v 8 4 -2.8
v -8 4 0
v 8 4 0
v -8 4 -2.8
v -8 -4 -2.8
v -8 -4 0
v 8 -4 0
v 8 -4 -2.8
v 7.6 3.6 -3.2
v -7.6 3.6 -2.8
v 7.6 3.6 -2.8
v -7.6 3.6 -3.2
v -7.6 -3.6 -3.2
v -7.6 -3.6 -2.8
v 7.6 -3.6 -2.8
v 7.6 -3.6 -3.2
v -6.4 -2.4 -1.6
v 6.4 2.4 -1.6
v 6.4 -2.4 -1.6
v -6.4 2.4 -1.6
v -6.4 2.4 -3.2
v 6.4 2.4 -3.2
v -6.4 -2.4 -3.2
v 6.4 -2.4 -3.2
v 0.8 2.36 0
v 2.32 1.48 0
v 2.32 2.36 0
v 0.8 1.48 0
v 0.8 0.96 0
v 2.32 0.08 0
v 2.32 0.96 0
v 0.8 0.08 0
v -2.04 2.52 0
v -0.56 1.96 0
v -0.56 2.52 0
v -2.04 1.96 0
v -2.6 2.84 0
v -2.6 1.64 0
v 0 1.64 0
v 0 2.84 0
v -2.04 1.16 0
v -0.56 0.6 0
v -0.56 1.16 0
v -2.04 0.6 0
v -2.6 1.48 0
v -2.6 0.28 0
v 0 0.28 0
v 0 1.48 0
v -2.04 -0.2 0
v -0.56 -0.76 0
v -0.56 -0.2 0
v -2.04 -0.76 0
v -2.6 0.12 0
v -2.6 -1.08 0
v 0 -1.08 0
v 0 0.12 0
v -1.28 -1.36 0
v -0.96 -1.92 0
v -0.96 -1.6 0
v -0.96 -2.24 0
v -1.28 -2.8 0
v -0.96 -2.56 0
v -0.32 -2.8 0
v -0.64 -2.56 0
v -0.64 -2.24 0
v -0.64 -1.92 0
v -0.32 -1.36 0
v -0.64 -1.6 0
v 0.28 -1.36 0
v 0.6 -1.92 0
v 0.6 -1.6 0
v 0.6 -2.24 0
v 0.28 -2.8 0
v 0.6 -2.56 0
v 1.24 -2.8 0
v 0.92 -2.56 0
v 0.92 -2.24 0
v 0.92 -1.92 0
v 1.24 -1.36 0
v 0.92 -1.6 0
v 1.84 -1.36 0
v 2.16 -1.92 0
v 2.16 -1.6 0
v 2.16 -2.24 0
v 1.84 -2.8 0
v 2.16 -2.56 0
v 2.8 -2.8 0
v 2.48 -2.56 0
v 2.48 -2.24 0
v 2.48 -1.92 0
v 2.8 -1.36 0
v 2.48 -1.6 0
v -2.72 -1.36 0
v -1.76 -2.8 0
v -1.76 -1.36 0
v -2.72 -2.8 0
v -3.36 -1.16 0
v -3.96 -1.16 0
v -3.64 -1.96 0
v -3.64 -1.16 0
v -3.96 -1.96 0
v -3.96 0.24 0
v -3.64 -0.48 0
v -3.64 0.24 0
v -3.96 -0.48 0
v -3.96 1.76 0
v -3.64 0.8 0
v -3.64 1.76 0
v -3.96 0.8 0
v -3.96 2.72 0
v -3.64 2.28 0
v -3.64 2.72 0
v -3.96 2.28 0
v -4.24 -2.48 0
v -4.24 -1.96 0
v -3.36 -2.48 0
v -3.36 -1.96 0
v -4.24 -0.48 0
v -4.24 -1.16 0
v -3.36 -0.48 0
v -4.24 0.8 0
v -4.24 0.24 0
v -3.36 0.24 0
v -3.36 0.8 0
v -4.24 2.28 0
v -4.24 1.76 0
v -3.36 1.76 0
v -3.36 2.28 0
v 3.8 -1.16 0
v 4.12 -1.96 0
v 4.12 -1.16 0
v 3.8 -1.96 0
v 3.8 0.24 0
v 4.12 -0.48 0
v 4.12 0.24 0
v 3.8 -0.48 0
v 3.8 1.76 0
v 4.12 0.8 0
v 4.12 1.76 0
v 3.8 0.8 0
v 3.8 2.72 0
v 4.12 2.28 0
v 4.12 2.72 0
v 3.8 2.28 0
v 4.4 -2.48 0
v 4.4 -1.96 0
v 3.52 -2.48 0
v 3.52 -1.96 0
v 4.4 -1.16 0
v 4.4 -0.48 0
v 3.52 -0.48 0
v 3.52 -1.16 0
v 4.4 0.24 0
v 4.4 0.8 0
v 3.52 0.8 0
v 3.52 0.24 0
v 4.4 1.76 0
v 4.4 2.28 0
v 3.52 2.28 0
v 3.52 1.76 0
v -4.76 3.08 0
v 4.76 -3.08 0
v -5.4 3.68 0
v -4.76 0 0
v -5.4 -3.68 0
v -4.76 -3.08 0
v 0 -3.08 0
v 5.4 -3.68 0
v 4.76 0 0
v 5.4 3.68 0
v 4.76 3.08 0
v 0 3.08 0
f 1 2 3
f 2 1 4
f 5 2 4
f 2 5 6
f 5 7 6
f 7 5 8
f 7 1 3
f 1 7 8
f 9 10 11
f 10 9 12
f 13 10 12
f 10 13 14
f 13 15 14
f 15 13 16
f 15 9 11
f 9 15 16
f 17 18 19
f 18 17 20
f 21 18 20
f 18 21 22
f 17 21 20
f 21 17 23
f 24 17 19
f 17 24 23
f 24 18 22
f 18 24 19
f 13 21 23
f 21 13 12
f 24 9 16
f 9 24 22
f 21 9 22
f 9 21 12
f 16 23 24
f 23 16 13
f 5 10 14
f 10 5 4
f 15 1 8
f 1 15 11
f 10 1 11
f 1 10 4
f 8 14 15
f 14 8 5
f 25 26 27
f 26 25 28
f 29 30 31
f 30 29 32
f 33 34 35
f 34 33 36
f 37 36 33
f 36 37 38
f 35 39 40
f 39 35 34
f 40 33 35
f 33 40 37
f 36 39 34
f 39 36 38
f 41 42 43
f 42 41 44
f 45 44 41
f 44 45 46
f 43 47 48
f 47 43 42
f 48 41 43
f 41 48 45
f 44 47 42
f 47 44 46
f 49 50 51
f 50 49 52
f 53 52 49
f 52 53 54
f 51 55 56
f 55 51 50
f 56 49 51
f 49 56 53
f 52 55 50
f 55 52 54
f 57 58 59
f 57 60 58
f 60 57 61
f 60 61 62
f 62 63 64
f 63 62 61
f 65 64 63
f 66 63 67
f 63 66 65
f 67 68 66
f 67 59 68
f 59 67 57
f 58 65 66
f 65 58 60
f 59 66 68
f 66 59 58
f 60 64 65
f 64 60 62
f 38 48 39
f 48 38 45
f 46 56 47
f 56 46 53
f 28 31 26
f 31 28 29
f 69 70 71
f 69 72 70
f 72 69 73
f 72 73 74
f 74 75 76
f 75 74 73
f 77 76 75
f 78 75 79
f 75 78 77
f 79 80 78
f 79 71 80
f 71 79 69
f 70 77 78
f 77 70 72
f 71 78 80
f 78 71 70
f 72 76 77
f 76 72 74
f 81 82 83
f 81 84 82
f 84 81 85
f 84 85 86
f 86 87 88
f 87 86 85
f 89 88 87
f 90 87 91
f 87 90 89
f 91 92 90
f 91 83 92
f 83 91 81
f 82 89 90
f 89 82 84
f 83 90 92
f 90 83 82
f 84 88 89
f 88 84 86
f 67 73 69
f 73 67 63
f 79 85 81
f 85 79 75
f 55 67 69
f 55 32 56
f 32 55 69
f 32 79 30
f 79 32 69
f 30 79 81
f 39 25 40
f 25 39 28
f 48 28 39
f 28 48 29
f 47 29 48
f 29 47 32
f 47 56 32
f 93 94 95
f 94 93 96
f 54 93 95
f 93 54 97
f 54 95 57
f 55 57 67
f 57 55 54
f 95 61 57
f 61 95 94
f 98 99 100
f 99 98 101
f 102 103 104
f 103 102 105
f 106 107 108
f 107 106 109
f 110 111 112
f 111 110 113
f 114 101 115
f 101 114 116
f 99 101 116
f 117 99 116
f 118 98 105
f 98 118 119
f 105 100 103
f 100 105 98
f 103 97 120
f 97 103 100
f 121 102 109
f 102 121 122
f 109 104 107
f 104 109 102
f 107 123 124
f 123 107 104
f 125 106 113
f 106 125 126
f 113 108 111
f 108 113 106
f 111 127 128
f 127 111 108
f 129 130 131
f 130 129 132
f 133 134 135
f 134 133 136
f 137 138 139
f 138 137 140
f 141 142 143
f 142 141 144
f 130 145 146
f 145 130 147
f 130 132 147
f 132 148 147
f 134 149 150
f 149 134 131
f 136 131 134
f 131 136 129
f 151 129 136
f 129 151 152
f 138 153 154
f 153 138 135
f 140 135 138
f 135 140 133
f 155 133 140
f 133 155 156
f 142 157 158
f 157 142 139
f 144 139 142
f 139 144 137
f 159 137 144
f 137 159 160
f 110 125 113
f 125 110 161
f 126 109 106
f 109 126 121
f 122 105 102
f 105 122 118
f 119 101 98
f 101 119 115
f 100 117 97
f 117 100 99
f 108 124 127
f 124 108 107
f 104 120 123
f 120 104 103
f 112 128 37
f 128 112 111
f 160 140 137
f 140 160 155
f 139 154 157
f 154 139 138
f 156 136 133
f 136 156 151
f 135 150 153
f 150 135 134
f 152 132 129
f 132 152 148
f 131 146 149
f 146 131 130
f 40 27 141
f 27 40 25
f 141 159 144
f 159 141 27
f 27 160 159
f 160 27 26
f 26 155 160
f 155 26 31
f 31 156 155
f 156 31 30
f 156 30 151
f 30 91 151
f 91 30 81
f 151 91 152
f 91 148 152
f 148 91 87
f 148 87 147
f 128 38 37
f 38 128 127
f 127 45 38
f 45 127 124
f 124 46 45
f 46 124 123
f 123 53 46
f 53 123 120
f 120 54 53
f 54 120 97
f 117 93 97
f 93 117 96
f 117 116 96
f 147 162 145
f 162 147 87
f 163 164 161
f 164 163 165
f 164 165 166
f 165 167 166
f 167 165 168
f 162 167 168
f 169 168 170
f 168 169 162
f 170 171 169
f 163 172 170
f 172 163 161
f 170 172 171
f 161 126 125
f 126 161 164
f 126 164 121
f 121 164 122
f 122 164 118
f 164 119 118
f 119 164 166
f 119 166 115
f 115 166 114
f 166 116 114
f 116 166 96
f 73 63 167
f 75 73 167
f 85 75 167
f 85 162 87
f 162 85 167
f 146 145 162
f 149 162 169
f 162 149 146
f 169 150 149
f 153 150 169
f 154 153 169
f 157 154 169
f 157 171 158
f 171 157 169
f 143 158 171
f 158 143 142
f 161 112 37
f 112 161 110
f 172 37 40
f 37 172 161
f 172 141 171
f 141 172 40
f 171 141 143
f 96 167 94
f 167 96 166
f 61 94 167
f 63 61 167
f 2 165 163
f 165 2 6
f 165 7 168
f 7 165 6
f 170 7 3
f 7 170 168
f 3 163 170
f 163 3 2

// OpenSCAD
// file: ../p/box5.scad
use <../lib.scad>
function ldraw_lib__box5() = [
// 0 Box with 5 Faces and All Edges
// 0 Name: box5.dat
// 0 Author: James Jessiman
// 0 !LDRAW_ORG Primitive UPDATE 2012-01
// 0 !LICENSE Licensed under CC BY 4.0 : see CAreadme.txt
// 
// 0 BFC CERTIFY CCW
  [0,"BFC","CERTIFY"],
  [0,"BFC","CCW"],
// 
// 0 !HISTORY 2002-04-03 [sbliss] Modified for BFC compliance
// 0 !HISTORY 2002-04-25 [PTadmin] Official Update 2002-02
// 0 !HISTORY 2007-06-24 [PTadmin] Header formatted for Contributor Agreement
// 0 !HISTORY 2008-07-01 [PTadmin] Official Update 2008-01
// 0 !HISTORY 2012-02-16 [Philo] Changed to CCW
// 0 !HISTORY 2012-03-30 [PTadmin] Official Update 2012-01
// 
// 
// 2 24 1 1 1 -1 1 1
  [2,24,1,1,1,-1,1,1],
// 2 24 -1 1 1 -1 1 -1
  [2,24,-1,1,1,-1,1,-1],
// 2 24 -1 1 -1 1 1 -1
  [2,24,-1,1,-1,1,1,-1],
// 2 24 1 1 -1 1 1 1
  [2,24,1,1,-1,1,1,1],
// 2 24 1 0 1 -1 0 1
  [2,24,1,0,1,-1,0,1],
// 2 24 -1 0 1 -1 0 -1
  [2,24,-1,0,1,-1,0,-1],
// 2 24 -1 0 -1 1 0 -1
  [2,24,-1,0,-1,1,0,-1],
// 2 24 1 0 -1 1 0 1
  [2,24,1,0,-1,1,0,1],
// 2 24 1 0 1 1 1 1
  [2,24,1,0,1,1,1,1],
// 2 24 -1 0 1 -1 1 1
  [2,24,-1,0,1,-1,1,1],
// 2 24 1 0 -1 1 1 -1
  [2,24,1,0,-1,1,1,-1],
// 2 24 -1 0 -1 -1 1 -1
  [2,24,-1,0,-1,-1,1,-1],
// 4 16 -1 1 1 1 1 1 1 1 -1 -1 1 -1
  [4,16,-1,1,1,1,1,1,1,1,-1,-1,1,-1],
// 4 16 -1 1 1 -1 0 1 1 0 1 1 1 1
  [4,16,-1,1,1,-1,0,1,1,0,1,1,1,1],
// 4 16 -1 1 -1 -1 0 -1 -1 0 1 -1 1 1
  [4,16,-1,1,-1,-1,0,-1,-1,0,1,-1,1,1],
// 4 16 1 1 -1 1 0 -1 -1 0 -1 -1 1 -1
  [4,16,1,1,-1,1,0,-1,-1,0,-1,-1,1,-1],
// 4 16 1 1 1 1 0 1 1 0 -1 1 1 -1
  [4,16,1,1,1,1,0,1,1,0,-1,1,1,-1],
];
module ldraw_lib__box5(step=0, col=false, unit=2/5, alt=false, line=0.2, solid=!$preview)
    makepoly(ldraw_lib__box5(), step=step, col=col, unit=unit, alt=alt, line=line, solid=solid);
ldraw_lib__box5(line=0.2);
// file: ../p/box4.scad
use <../lib.scad>
function ldraw_lib__box4() = [
// 0 Box with 4 Faces (2 Parallel Pairs) and All Edges
// 0 Name: box4.dat
// 0 Author: James Jessiman
// 0 !LDRAW_ORG Primitive UPDATE 2012-01
// 0 !LICENSE Licensed under CC BY 4.0 : see CAreadme.txt
// 
// 0 BFC CERTIFY CCW
  [0,"BFC","CERTIFY"],
  [0,"BFC","CCW"],
// 
// 0 !HISTORY 2002-04-03 [sbliss] Modified for BFC compliance
// 0 !HISTORY 2002-04-25 [PTadmin] Official Update 2002-02
// 0 !HISTORY 2007-06-24 [PTadmin] Header formatted for Contributor Agreement
// 0 !HISTORY 2008-07-01 [PTadmin] Official Update 2008-01
// 0 !HISTORY 2012-02-16 [Philo] Changed to CCW
// 0 !HISTORY 2012-03-30 [PTadmin] Official Update 2012-01
// 
// 
// 2 24 1 1 1 -1 1 1
  [2,24,1,1,1,-1,1,1],
// 2 24 -1 1 1 -1 1 -1
  [2,24,-1,1,1,-1,1,-1],
// 2 24 -1 1 -1 1 1 -1
  [2,24,-1,1,-1,1,1,-1],
// 2 24 1 1 -1 1 1 1
  [2,24,1,1,-1,1,1,1],
// 2 24 1 0 1 -1 0 1
  [2,24,1,0,1,-1,0,1],
// 2 24 -1 0 1 -1 0 -1
  [2,24,-1,0,1,-1,0,-1],
// 2 24 -1 0 -1 1 0 -1
  [2,24,-1,0,-1,1,0,-1],
// 2 24 1 0 -1 1 0 1
  [2,24,1,0,-1,1,0,1],
// 2 24 1 0 1 1 1 1
  [2,24,1,0,1,1,1,1],
// 2 24 -1 0 1 -1 1 1
  [2,24,-1,0,1,-1,1,1],
// 2 24 1 0 -1 1 1 -1
  [2,24,1,0,-1,1,1,-1],
// 2 24 -1 0 -1 -1 1 -1
  [2,24,-1,0,-1,-1,1,-1],
// 4 16 -1 1 1 -1 0 1 1 0 1 1 1 1
  [4,16,-1,1,1,-1,0,1,1,0,1,1,1,1],
// 4 16 -1 1 -1 -1 0 -1 -1 0 1 -1 1 1
  [4,16,-1,1,-1,-1,0,-1,-1,0,1,-1,1,1],
// 4 16 1 1 -1 1 0 -1 -1 0 -1 -1 1 -1
  [4,16,1,1,-1,1,0,-1,-1,0,-1,-1,1,-1],
// 4 16 1 1 1 1 0 1 1 0 -1 1 1 -1
  [4,16,1,1,1,1,0,1,1,0,-1,1,1,-1],
];
module ldraw_lib__box4(step=0, col=false, unit=2/5, alt=false, line=0.2, solid=!$preview)
    makepoly(ldraw_lib__box4(), step=step, col=col, unit=unit, alt=alt, line=line, solid=solid);
ldraw_lib__box4(line=0.2);
// file: s/3069bs01.scad
use <../../lib.scad>
use <../../p/box4.scad>
use <../../p/box5.scad>
function ldraw_lib__s__3069bs01() = [
// 0 ~Tile  1 x  2 with Groove without Top Face
// 0 Name: s\3069bs01.dat
// 0 Author: Santeri Piippo [arezey]
// 0 !LDRAW_ORG Subpart UPDATE 2010-02
// 0 !LICENSE Licensed under CC BY 4.0 : see CAreadme.txt
// 
// 0 BFC CERTIFY CCW
  [0,"BFC","CERTIFY"],
  [0,"BFC","CCW"],
// 
// 0 !HISTORY 2010-07-05 [PTadmin] Official Update 2010-02
// 
// 
// 1 16 0 0 0 20 0 0 0 7 0 0 0 10 box4.dat
  [1,16,0,0,0,20,0,0,0,7,0,0,0,10, ldraw_lib__box4()],
// 1 16 0 7 0 19 0 0 0 1 0 0 0 9 box4.dat
  [1,16,0,7,0,19,0,0,0,1,0,0,0,9, ldraw_lib__box4()],
// 0 BFC INVERTNEXT
  [0,"BFC","INVERTNEXT"],
// 1 16 0 8 0 16 0 0 0 -4 0 0 0 6 box5.dat
  [1,16,0,8,0,16,0,0,0,-4,0,0,0,6, ldraw_lib__box5()],
// 4 16 -19 8 9 -16 8 6 -16 8 -6 -19 8 -9
  [4,16,-19,8,9,-16,8,6,-16,8,-6,-19,8,-9],
// 4 16 19 8 -9 16 8 -6 16 8 6 19 8 9
  [4,16,19,8,-9,16,8,-6,16,8,6,19,8,9],
// 4 16 19 8 9 16 8 6 -16 8 6 -19 8 9
  [4,16,19,8,9,16,8,6,-16,8,6,-19,8,9],
// 4 16 -19 8 -9 -16 8 -6 16 8 -6 19 8 -9
  [4,16,-19,8,-9,-16,8,-6,16,8,-6,19,8,-9],
// 4 16 -20 7 10 -19 7 9 -19 7 -9 -20 7 -10
  [4,16,-20,7,10,-19,7,9,-19,7,-9,-20,7,-10],
// 4 16 20 7 -10 19 7 -9 19 7 9 20 7 10
  [4,16,20,7,-10,19,7,-9,19,7,9,20,7,10],
// 4 16 20 7 10 19 7 9 -19 7 9 -20 7 10
  [4,16,20,7,10,19,7,9,-19,7,9,-20,7,10],
// 4 16 -20 7 -10 -19 7 -9 19 7 -9 20 7 -10
  [4,16,-20,7,-10,-19,7,-9,19,7,-9,20,7,-10],
// 0 //
];
module ldraw_lib__s__3069bs01(step=0, col=false, unit=2/5, alt=false, line=0.2, solid=!$preview)
    makepoly(ldraw_lib__s__3069bs01(), step=step, col=col, unit=unit, alt=alt, line=line, solid=solid);
ldraw_lib__s__3069bs01(line=0.2);
// main file
use <../lib.scad>
use <s/3069bs01.scad>
function ldraw_lib__3069bpzk() = [
// 0 Tile  1 x  2 with Dark Bluish Grey Rectangle, Metallic Silver, Green and Red Buttons Pattern
// 0 Name: 3069bpzk.dat
// 0 Author: Evert-Jan Boer [ejboer]
// 0 !LDRAW_ORG Part UPDATE 2023-06
// 0 !LICENSE Licensed under CC BY 4.0 : see CAreadme.txt
// 
// 0 BFC CERTIFY CCW
  [0,"BFC","CERTIFY"],
  [0,"BFC","CCW"],
// 
// 0 !KEYWORDS BrickLink 3069pb1119, control panel, Darth Vader
// 0 !KEYWORDS Rebrickable 3069bpr0360, Set 40547, Star Wars
// 
// 0 !HISTORY 2023-11-19 [OrionP] Official Update 2023-06
// 
// 
// 1 16 0 0 0 1 0 0 0 1 0 0 0 1 s\3069bs01.dat
  [1,16,0,0,0,1,0,0,0,1,0,0,0,1, ldraw_lib__s__3069bs01()],
// 
// 4 2 2 0 5.9 2 0 3.7 5.8 0 3.7 5.8 0 5.9
  [4,2,2,0,5.9,2,0,3.7,5.8,0,3.7,5.8,0,5.9],
// 4 4 2 0 2.4 2 0 .2 5.8 0 .2 5.8 0 2.4
  [4,4,2,0,2.4,2,0,.2,5.8,0,.2,5.8,0,2.4],
// 4 4 -5.1 0 6.3 -5.1 0 4.9 -1.4 0 4.9 -1.4 0 6.3
  [4,4,-5.1,0,6.3,-5.1,0,4.9,-1.4,0,4.9,-1.4,0,6.3],
// 4 72 -5.1 0 6.3 -6.5 0 7.1 -6.5 0 4.1 -5.1 0 4.9
  [4,72,-5.1,0,6.3,-6.5,0,7.1,-6.5,0,4.1,-5.1,0,4.9],
// 4 72 -1.4 0 4.9 0 0 4.1 0 0 7.1 -1.4 0 6.3
  [4,72,-1.4,0,4.9,0,0,4.1,0,0,7.1,-1.4,0,6.3],
// 4 72 -5.1 0 6.3 -1.4 0 6.3 0 0 7.1 -6.5 0 7.1
  [4,72,-5.1,0,6.3,-1.4,0,6.3,0,0,7.1,-6.5,0,7.1],
// 4 72 -6.5 0 4.1 0 0 4.1 -1.4 0 4.9 -5.1 0 4.9
  [4,72,-6.5,0,4.1,0,0,4.1,-1.4,0,4.9,-5.1,0,4.9],
// 4 4 -5.1 0 2.9 -5.1 0 1.5 -1.4 0 1.5 -1.4 0 2.9
  [4,4,-5.1,0,2.9,-5.1,0,1.5,-1.4,0,1.5,-1.4,0,2.9],
// 4 72 -6.5 0 .7 -5.1 0 1.5 -5.1 0 2.9 -6.5 0 3.7
  [4,72,-6.5,0,.7,-5.1,0,1.5,-5.1,0,2.9,-6.5,0,3.7],
// 4 72 -1.4 0 1.5 0 0 .7 0 0 3.7 -1.4 0 2.9
  [4,72,-1.4,0,1.5,0,0,.7,0,0,3.7,-1.4,0,2.9],
// 4 72 -5.1 0 2.9 -1.4 0 2.9 0 0 3.7 -6.5 0 3.7
  [4,72,-5.1,0,2.9,-1.4,0,2.9,0,0,3.7,-6.5,0,3.7],
// 4 72 -6.5 0 .7 0 0 .7 -1.4 0 1.5 -5.1 0 1.5
  [4,72,-6.5,0,.7,0,0,.7,-1.4,0,1.5,-5.1,0,1.5],
// 4 4 -5.1 0 -.5 -5.1 0 -1.9 -1.4 0 -1.9 -1.4 0 -.5
  [4,4,-5.1,0,-.5,-5.1,0,-1.9,-1.4,0,-1.9,-1.4,0,-.5],
// 4 72 -6.5 0 -2.7 -5.1 0 -1.9 -5.1 0 -.5 -6.5 0 .3
  [4,72,-6.5,0,-2.7,-5.1,0,-1.9,-5.1,0,-.5,-6.5,0,.3],
// 4 72 -1.4 0 -1.9 0 0 -2.7 0 0 .3 -1.4 0 -.5
  [4,72,-1.4,0,-1.9,0,0,-2.7,0,0,.3,-1.4,0,-.5],
// 4 72 -5.1 0 -.5 -1.4 0 -.5 0 0 .3 -6.5 0 .3
  [4,72,-5.1,0,-.5,-1.4,0,-.5,0,0,.3,-6.5,0,.3],
// 4 72 -6.5 0 -2.7 0 0 -2.7 -1.4 0 -1.9 -5.1 0 -1.9
  [4,72,-6.5,0,-2.7,0,0,-2.7,-1.4,0,-1.9,-5.1,0,-1.9],
// 3 72 -3.2 0.0 -3.4 -2.4 0.0 -4.8 -2.4 0.0 -4.0
  [3,72,-3.2,0.0,-3.4,-2.4,0.0,-4.8,-2.4,0.0,-4.0],
// 4 72 -3.2 0 -7 -2.4 0 -5.6 -2.4 0 -4.8 -3.2 0 -3.4
  [4,72,-3.2,0,-7,-2.4,0,-5.6,-2.4,0,-4.8,-3.2,0,-3.4],
// 3 72 -2.4 0.0 -5.6 -3.2 0.0 -7.0 -2.4 0.0 -6.4
  [3,72,-2.4,0.0,-5.6,-3.2,0.0,-7.0,-2.4,0.0,-6.4],
// 4 72 -3.2 0 -7 -.8 0 -7 -1.6 0 -6.4 -2.4 0 -6.4
  [4,72,-3.2,0,-7,-.8,0,-7,-1.6,0,-6.4,-2.4,0,-6.4],
// 3 72 -1.6 0.0 -5.6 -1.6 0.0 -6.4 -0.8 0.0 -7.0
  [3,72,-1.6,0.0,-5.6,-1.6,0.0,-6.4,-0.8,0.0,-7.0],
// 4 72 -1.6 0 -5.6 -.8 0 -7 -.8 0 -3.4 -1.6 0 -4.8
  [4,72,-1.6,0,-5.6,-.8,0,-7,-.8,0,-3.4,-1.6,0,-4.8],
// 3 72 -0.8 0.0 -3.4 -1.6 0.0 -4.0 -1.6 0.0 -4.8
  [3,72,-0.8,0.0,-3.4,-1.6,0.0,-4.0,-1.6,0.0,-4.8],
// 4 72 -2.4 0 -4 -1.6 0 -4 -.8 0 -3.4 -3.2 0 -3.4
  [4,72,-2.4,0,-4,-1.6,0,-4,-.8,0,-3.4,-3.2,0,-3.4],
// 4 72 -2.4 0 -4.8 -2.4 0 -5.6 -1.6 0 -5.6 -1.6 0 -4.8
  [4,72,-2.4,0,-4.8,-2.4,0,-5.6,-1.6,0,-5.6,-1.6,0,-4.8],
// 4 16 -2.4 0 -4 -2.4 0 -4.8 -1.6 0 -4.8 -1.6 0 -4
  [4,16,-2.4,0,-4,-2.4,0,-4.8,-1.6,0,-4.8,-1.6,0,-4],
// 4 16 -2.4 0 -5.6 -2.4 0 -6.4 -1.6 0 -6.4 -1.6 0 -5.6
  [4,16,-2.4,0,-5.6,-2.4,0,-6.4,-1.6,0,-6.4,-1.6,0,-5.6],
// 4 16 -6.5 0 4.1 -6.5 0 3.7 0 0 3.7 0 0 4.1
  [4,16,-6.5,0,4.1,-6.5,0,3.7,0,0,3.7,0,0,4.1],
// 4 16 0 0 .3 0 0 .7 -6.5 0 .7 -6.5 0 .3
  [4,16,0,0,.3,0,0,.7,-6.5,0,.7,-6.5,0,.3],
// 4 16 2 0 3.7 2 0 2.4 5.8 0 2.4 5.8 0 3.7
  [4,16,2,0,3.7,2,0,2.4,5.8,0,2.4,5.8,0,3.7],
// 3 72 0.7 0.0 -3.4 1.5 0.0 -4.8 1.5 0.0 -4.0
  [3,72,0.7,0.0,-3.4,1.5,0.0,-4.8,1.5,0.0,-4.0],
// 4 72 .7 0 -7 1.5 0 -5.6 1.5 0 -4.8 .7 0 -3.4
  [4,72,.7,0,-7,1.5,0,-5.6,1.5,0,-4.8,.7,0,-3.4],
// 3 72 1.5 0.0 -5.6 0.7 0.0 -7.0 1.5 0.0 -6.4
  [3,72,1.5,0.0,-5.6,0.7,0.0,-7.0,1.5,0.0,-6.4],
// 4 72 .7 0 -7 3.1 0 -7 2.3 0 -6.4 1.5 0 -6.4
  [4,72,.7,0,-7,3.1,0,-7,2.3,0,-6.4,1.5,0,-6.4],
// 3 72 2.3 0.0 -5.6 2.3 0.0 -6.4 3.1 0.0 -7.0
  [3,72,2.3,0.0,-5.6,2.3,0.0,-6.4,3.1,0.0,-7.0],
// 4 72 2.3 0 -5.6 3.1 0 -7 3.1 0 -3.4 2.3 0 -4.8
  [4,72,2.3,0,-5.6,3.1,0,-7,3.1,0,-3.4,2.3,0,-4.8],
// 3 72 3.1 0.0 -3.4 2.3 0.0 -4.0 2.3 0.0 -4.8
  [3,72,3.1,0.0,-3.4,2.3,0.0,-4.0,2.3,0.0,-4.8],
// 4 72 1.5 0 -4 2.3 0 -4 3.1 0 -3.4 .7 0 -3.4
  [4,72,1.5,0,-4,2.3,0,-4,3.1,0,-3.4,.7,0,-3.4],
// 4 72 2.3 0 -5.6 2.3 0 -4.8 1.5 0 -4.8 1.5 0 -5.6
  [4,72,2.3,0,-5.6,2.3,0,-4.8,1.5,0,-4.8,1.5,0,-5.6],
// 4 16 1.5 0 -4 1.5 0 -4.8 2.3 0 -4.8 2.3 0 -4
  [4,16,1.5,0,-4,1.5,0,-4.8,2.3,0,-4.8,2.3,0,-4],
// 4 16 1.5 0 -5.6 1.5 0 -6.4 2.3 0 -6.4 2.3 0 -5.6
  [4,16,1.5,0,-5.6,1.5,0,-6.4,2.3,0,-6.4,2.3,0,-5.6],
// 3 72 4.6 0.0 -3.4 5.4 0.0 -4.8 5.4 0.0 -4.0
  [3,72,4.6,0.0,-3.4,5.4,0.0,-4.8,5.4,0.0,-4.0],
// 4 72 4.6 0 -7 5.4 0 -5.6 5.4 0 -4.8 4.6 0 -3.4
  [4,72,4.6,0,-7,5.4,0,-5.6,5.4,0,-4.8,4.6,0,-3.4],
// 3 72 5.4 0.0 -5.6 4.6 0.0 -7.0 5.4 0.0 -6.4
  [3,72,5.4,0.0,-5.6,4.6,0.0,-7.0,5.4,0.0,-6.4],
// 4 72 4.6 0 -7 7 0 -7 6.2 0 -6.4 5.4 0 -6.4
  [4,72,4.6,0,-7,7,0,-7,6.2,0,-6.4,5.4,0,-6.4],
// 3 72 6.2 0.0 -5.6 6.2 0.0 -6.4 7 0 -7
  [3,72,6.2,0.0,-5.6,6.2,0.0,-6.4,7,0,-7],
// 4 72 6.2 0 -5.6 7 0 -7 7 0 -3.4 6.2 0 -4.8
  [4,72,6.2,0,-5.6,7,0,-7,7,0,-3.4,6.2,0,-4.8],
// 3 72 7.0 0.0 -3.4 6.2 0.0 -4.0 6.2 0.0 -4.8
  [3,72,7.0,0.0,-3.4,6.2,0.0,-4.0,6.2,0.0,-4.8],
// 4 72 5.4 0 -4 6.2 0 -4 7 0 -3.4 4.6 0 -3.4
  [4,72,5.4,0,-4,6.2,0,-4,7,0,-3.4,4.6,0,-3.4],
// 4 72 5.4 0 -4.8 5.4 0 -5.6 6.2 0 -5.6 6.2 0 -4.8
  [4,72,5.4,0,-4.8,5.4,0,-5.6,6.2,0,-5.6,6.2,0,-4.8],
// 4 16 5.4 0 -4 5.4 0 -4.8 6.2 0 -4.8 6.2 0 -4
  [4,16,5.4,0,-4,5.4,0,-4.8,6.2,0,-4.8,6.2,0,-4],
// 4 16 5.4 0 -5.6 5.4 0 -6.4 6.2 0 -6.4 6.2 0 -5.6
  [4,16,5.4,0,-5.6,5.4,0,-6.4,6.2,0,-6.4,6.2,0,-5.6],
// 4 16 -.8 0 -3.4 -.8 0 -7 .7 0 -7 .7 0 -3.4
  [4,16,-.8,0,-3.4,-.8,0,-7,.7,0,-7,.7,0,-3.4],
// 4 16 3.1 0 -3.4 3.1 0 -7 4.6 0 -7 4.6 0 -3.4
  [4,16,3.1,0,-3.4,3.1,0,-7,4.6,0,-7,4.6,0,-3.4],
// 3 16 0.0 0.0 -2.7 -0.8 0.0 -3.4 0.7 0.0 -3.4
  [3,16,0.0,0.0,-2.7,-0.8,0.0,-3.4,0.7,0.0,-3.4],
// 4 16 0 0 .3 0 0 -2.7 .7 0 -3.4 2 0 .2
  [4,16,0,0,.3,0,0,-2.7,.7,0,-3.4,2,0,.2],
// 4 16 .7 0 -3.4 3.1 0 -3.4 5.8 0 .2 2 0 .2
  [4,16,.7,0,-3.4,3.1,0,-3.4,5.8,0,.2,2,0,.2],
// 3 16 5.8 0.0 0.2 3.1 0.0 -3.4 4.6 0.0 -3.4
  [3,16,5.8,0.0,0.2,3.1,0.0,-3.4,4.6,0.0,-3.4],
// 4 16 2 0 3.7 2 0 5.9 0 0 7.1 0 0 4.1
  [4,16,2,0,3.7,2,0,5.9,0,0,7.1,0,0,4.1],
// 4 16 2 0 2.4 2 0 3.7 0 0 4.1 0 0 3.7
  [4,16,2,0,2.4,2,0,3.7,0,0,4.1,0,0,3.7],
// 4 16 2 0 .2 2 0 2.4 0 0 3.7 0 0 .7
  [4,16,2,0,.2,2,0,2.4,0,0,3.7,0,0,.7],
// 3 16 0.0 0.0 0.7 0.0 0.0 0.3 2.0 0.0 0.2
  [3,16,0.0,0.0,0.7,0.0,0.0,0.3,2.0,0.0,0.2],
// 4 80 -4.4 0 -7 -4.4 0 -3.4 -6.8 0 -3.4 -6.8 0 -7
  [4,80,-4.4,0,-7,-4.4,0,-3.4,-6.8,0,-3.4,-6.8,0,-7],
// 4 16 -8.4 0 -2.9 -6.8 0 -3.4 -4.4 0 -3.4 -6.5 0 -2.7
  [4,16,-8.4,0,-2.9,-6.8,0,-3.4,-4.4,0,-3.4,-6.5,0,-2.7],
// 3 16 -6.5 0.0 -2.7 -4.4 0.0 -3.4 -3.2 0.0 -3.4
  [3,16,-6.5,0.0,-2.7,-4.4,0.0,-3.4,-3.2,0.0,-3.4],
// 4 16 -.8 0 -3.4 0 0 -2.7 -6.5 0 -2.7 -3.2 0 -3.4
  [4,16,-.8,0,-3.4,0,0,-2.7,-6.5,0,-2.7,-3.2,0,-3.4],
// 4 16 -3.2 0 -7 -3.2 0 -3.4 -4.4 0 -3.4 -4.4 0 -7
  [4,16,-3.2,0,-7,-3.2,0,-3.4,-4.4,0,-3.4,-4.4,0,-7],
// 4 80 -9.9 0 -2.9 -9.9 0 -4.9 -9.1 0 -4.9 -9.1 0 -2.9
  [4,80,-9.9,0,-2.9,-9.9,0,-4.9,-9.1,0,-4.9,-9.1,0,-2.9],
// 4 80 -9.9 0 .6 -9.9 0 -1.2 -9.1 0 -1.2 -9.1 0 .6
  [4,80,-9.9,0,.6,-9.9,0,-1.2,-9.1,0,-1.2,-9.1,0,.6],
// 4 80 -9.9 0 4.4 -9.9 0 2 -9.1 0 2 -9.1 0 4.4
  [4,80,-9.9,0,4.4,-9.9,0,2,-9.1,0,2,-9.1,0,4.4],
// 4 80 -9.9 0 6.8 -9.9 0 5.7 -9.1 0 5.7 -9.1 0 6.8
  [4,80,-9.9,0,6.8,-9.9,0,5.7,-9.1,0,5.7,-9.1,0,6.8],
// 4 80 -10.6 0 -4.9 -10.6 0 -6.2 -8.4 0 -6.2 -9.9 0 -4.9
  [4,80,-10.6,0,-4.9,-10.6,0,-6.2,-8.4,0,-6.2,-9.9,0,-4.9],
// 3 80 -9.1 0.0 -4.9 -9.9 0.0 -4.9 -8.4 0.0 -6.2
  [3,80,-9.1,0.0,-4.9,-9.9,0.0,-4.9,-8.4,0.0,-6.2],
// 3 80 -8.4 0.0 -4.9 -9.1 0.0 -4.9 -8.4 0.0 -6.2
  [3,80,-8.4,0.0,-4.9,-9.1,0.0,-4.9,-8.4,0.0,-6.2],
// 4 80 -10.6 0 -1.2 -10.6 0 -2.9 -9.9 0 -2.9 -9.9 0 -1.2
  [4,80,-10.6,0,-1.2,-10.6,0,-2.9,-9.9,0,-2.9,-9.9,0,-1.2],
// 4 80 -9.1 0 -2.9 -9.1 0 -1.2 -9.9 0 -1.2 -9.9 0 -2.9
  [4,80,-9.1,0,-2.9,-9.1,0,-1.2,-9.9,0,-1.2,-9.9,0,-2.9],
// 4 80 -9.1 0 -1.2 -9.1 0 -2.9 -8.4 0 -2.9 -8.4 0 -1.2
  [4,80,-9.1,0,-1.2,-9.1,0,-2.9,-8.4,0,-2.9,-8.4,0,-1.2],
// 4 80 -10.6 0 2 -10.6 0 .6 -9.9 0 .6 -9.9 0 2
  [4,80,-10.6,0,2,-10.6,0,.6,-9.9,0,.6,-9.9,0,2],
// 4 80 -9.9 0 2 -9.9 0 .6 -9.1 0 .6 -9.1 0 2
  [4,80,-9.9,0,2,-9.9,0,.6,-9.1,0,.6,-9.1,0,2],
// 4 80 -9.1 0 2 -9.1 0 .6 -8.4 0 .6 -8.4 0 2
  [4,80,-9.1,0,2,-9.1,0,.6,-8.4,0,.6,-8.4,0,2],
// 4 80 -10.6 0 5.7 -10.6 0 4.4 -9.9 0 4.4 -9.9 0 5.7
  [4,80,-10.6,0,5.7,-10.6,0,4.4,-9.9,0,4.4,-9.9,0,5.7],
// 4 80 -9.9 0 5.7 -9.9 0 4.4 -9.1 0 4.4 -9.1 0 5.7
  [4,80,-9.9,0,5.7,-9.9,0,4.4,-9.1,0,4.4,-9.1,0,5.7],
// 4 80 -9.1 0 5.7 -9.1 0 4.4 -8.4 0 4.4 -8.4 0 5.7
  [4,80,-9.1,0,5.7,-9.1,0,4.4,-8.4,0,4.4,-8.4,0,5.7],
// 4 80 9.5 0 -4.9 10.3 0 -4.9 10.3 0 -2.9 9.5 0 -2.9
  [4,80,9.5,0,-4.9,10.3,0,-4.9,10.3,0,-2.9,9.5,0,-2.9],
// 4 80 10.3 0 .6 9.5 0 .6 9.5 0 -1.2 10.3 0 -1.2
  [4,80,10.3,0,.6,9.5,0,.6,9.5,0,-1.2,10.3,0,-1.2],
// 4 80 10.3 0 4.4 9.5 0 4.4 9.5 0 2 10.3 0 2
  [4,80,10.3,0,4.4,9.5,0,4.4,9.5,0,2,10.3,0,2],
// 4 80 10.3 0 6.8 9.5 0 6.8 9.5 0 5.7 10.3 0 5.7
  [4,80,10.3,0,6.8,9.5,0,6.8,9.5,0,5.7,10.3,0,5.7],
// 4 80 11 0 -4.9 10.3 0 -4.9 8.8 0 -6.2 11 0 -6.2
  [4,80,11,0,-4.9,10.3,0,-4.9,8.8,0,-6.2,11,0,-6.2],
// 3 80 10.3 0.0 -4.9 9.5 0.0 -4.9 8.8 0.0 -6.2
  [3,80,10.3,0.0,-4.9,9.5,0.0,-4.9,8.8,0.0,-6.2],
// 3 80 9.5 0.0 -4.9 8.8 0.0 -4.9 8.8 0.0 -6.2
  [3,80,9.5,0.0,-4.9,8.8,0.0,-4.9,8.8,0.0,-6.2],
// 4 80 11 0 -1.2 10.3 0 -1.2 10.3 0 -2.9 11 0 -2.9
  [4,80,11,0,-1.2,10.3,0,-1.2,10.3,0,-2.9,11,0,-2.9],
// 4 80 10.3 0 -1.2 9.5 0 -1.2 9.5 0 -2.9 10.3 0 -2.9
  [4,80,10.3,0,-1.2,9.5,0,-1.2,9.5,0,-2.9,10.3,0,-2.9],
// 4 80 8.8 0 -2.9 9.5 0 -2.9 9.5 0 -1.2 8.8 0 -1.2
  [4,80,8.8,0,-2.9,9.5,0,-2.9,9.5,0,-1.2,8.8,0,-1.2],
// 4 80 11 0 2 10.3 0 2 10.3 0 .6 11 0 .6
  [4,80,11,0,2,10.3,0,2,10.3,0,.6,11,0,.6],
// 4 80 10.3 0 2 9.5 0 2 9.5 0 .6 10.3 0 .6
  [4,80,10.3,0,2,9.5,0,2,9.5,0,.6,10.3,0,.6],
// 4 80 9.5 0 2 8.8 0 2 8.8 0 .6 9.5 0 .6
  [4,80,9.5,0,2,8.8,0,2,8.8,0,.6,9.5,0,.6],
// 4 80 11 0 5.7 10.3 0 5.7 10.3 0 4.4 11 0 4.4
  [4,80,11,0,5.7,10.3,0,5.7,10.3,0,4.4,11,0,4.4],
// 4 80 10.3 0 5.7 9.5 0 5.7 9.5 0 4.4 10.3 0 4.4
  [4,80,10.3,0,5.7,9.5,0,5.7,9.5,0,4.4,10.3,0,4.4],
// 4 80 9.5 0 5.7 8.8 0 5.7 8.8 0 4.4 9.5 0 4.4
  [4,80,9.5,0,5.7,8.8,0,5.7,8.8,0,4.4,9.5,0,4.4],
// 4 16 -11.9 0 7.7 -10.6 0 5.7 -9.9 0 5.7 -9.9 0 6.8
  [4,16,-11.9,0,7.7,-10.6,0,5.7,-9.9,0,5.7,-9.9,0,6.8],
// 4 16 -9.9 0 2 -9.9 0 4.4 -10.6 0 4.4 -10.6 0 2
  [4,16,-9.9,0,2,-9.9,0,4.4,-10.6,0,4.4,-10.6,0,2],
// 4 16 -9.9 0 -1.2 -9.9 0 .6 -10.6 0 .6 -10.6 0 -1.2
  [4,16,-9.9,0,-1.2,-9.9,0,.6,-10.6,0,.6,-10.6,0,-1.2],
// 4 16 -9.9 0 -4.9 -9.9 0 -2.9 -10.6 0 -2.9 -10.6 0 -4.9
  [4,16,-9.9,0,-4.9,-9.9,0,-2.9,-10.6,0,-2.9,-10.6,0,-4.9],
// 4 16 -8.4 0 -4.9 -8.4 0 -2.9 -9.1 0 -2.9 -9.1 0 -4.9
  [4,16,-8.4,0,-4.9,-8.4,0,-2.9,-9.1,0,-2.9,-9.1,0,-4.9],
// 4 16 -8.4 0 2 -8.4 0 4.4 -9.1 0 4.4 -9.1 0 2
  [4,16,-8.4,0,2,-8.4,0,4.4,-9.1,0,4.4,-9.1,0,2],
// 4 16 -8.4 0 -1.2 -8.4 0 .6 -9.1 0 .6 -9.1 0 -1.2
  [4,16,-8.4,0,-1.2,-8.4,0,.6,-9.1,0,.6,-9.1,0,-1.2],
// 4 16 -6.5 0 7.1 -9.1 0 6.8 -9.1 0 5.7 -8.4 0 5.7
  [4,16,-6.5,0,7.1,-9.1,0,6.8,-9.1,0,5.7,-8.4,0,5.7],
// 4 16 8.8 0 4.4 8.8 0 2 9.5 0 2 9.5 0 4.4
  [4,16,8.8,0,4.4,8.8,0,2,9.5,0,2,9.5,0,4.4],
// 4 16 11 0 2 11 0 4.4 10.3 0 4.4 10.3 0 2
  [4,16,11,0,2,11,0,4.4,10.3,0,4.4,10.3,0,2],
// 4 16 8.8 0 .6 8.8 0 -1.2 9.5 0 -1.2 9.5 0 .6
  [4,16,8.8,0,.6,8.8,0,-1.2,9.5,0,-1.2,9.5,0,.6],
// 4 16 10.3 0 .6 10.3 0 -1.2 11 0 -1.2 11 0 .6
  [4,16,10.3,0,.6,10.3,0,-1.2,11,0,-1.2,11,0,.6],
// 4 16 8.8 0 -2.9 8.8 0 -4.9 9.5 0 -4.9 9.5 0 -2.9
  [4,16,8.8,0,-2.9,8.8,0,-4.9,9.5,0,-4.9,9.5,0,-2.9],
// 4 16 10.3 0 -2.9 10.3 0 -4.9 11 0 -4.9 11 0 -2.9
  [4,16,10.3,0,-2.9,10.3,0,-4.9,11,0,-4.9,11,0,-2.9],
// 4 16 2 0 5.9 5.8 0 5.9 9.5 0 6.8 0 0 7.1
  [4,16,2,0,5.9,5.8,0,5.9,9.5,0,6.8,0,0,7.1],
// 4 16 9.5 0 5.7 9.5 0 6.8 5.8 0 5.9 8.8 0 5.7
  [4,16,9.5,0,5.7,9.5,0,6.8,5.8,0,5.9,8.8,0,5.7],
// 4 16 5.8 0 5.9 5.8 0 3.7 8.8 0 4.4 8.8 0 5.7
  [4,16,5.8,0,5.9,5.8,0,3.7,8.8,0,4.4,8.8,0,5.7],
// 4 16 8.8 0 2 8.8 0 4.4 5.8 0 3.7 5.8 0 2.4
  [4,16,8.8,0,2,8.8,0,4.4,5.8,0,3.7,5.8,0,2.4],
// 4 16 5.8 0 .2 8.8 0 .6 8.8 0 2 5.8 0 2.4
  [4,16,5.8,0,.2,8.8,0,.6,8.8,0,2,5.8,0,2.4],
// 3 16 8.8 0.0 0.6 5.8 0.0 0.2 8.8 0.0 -1.2
  [3,16,8.8,0.0,0.6,5.8,0.0,0.2,8.8,0.0,-1.2],
// 4 16 4.6 0 -3.4 7 0 -3.4 8.8 0 -1.2 5.8 0 .2
  [4,16,4.6,0,-3.4,7,0,-3.4,8.8,0,-1.2,5.8,0,.2],
// 3 16 8.8 0.0 -1.2 7.0 0.0 -3.4 8.8 0.0 -2.9
  [3,16,8.8,0.0,-1.2,7.0,0.0,-3.4,8.8,0.0,-2.9],
// 4 16 8.8 0 -2.9 7 0 -3.4 7 0 -7 8.8 0 -4.9
  [4,16,8.8,0,-2.9,7,0,-3.4,7,0,-7,8.8,0,-4.9],
// 3 16 8.8 0.0 -4.9 7 0 -7 8.8 0.0 -6.2
  [3,16,8.8,0.0,-4.9,7,0,-7,8.8,0.0,-6.2],
// 4 16 -6.5 0 7.1 -8.4 0 5.7 -8.4 0 4.4 -6.5 0 4.1
  [4,16,-6.5,0,7.1,-8.4,0,5.7,-8.4,0,4.4,-6.5,0,4.1],
// 4 16 -6.5 0 4.1 -8.4 0 4.4 -8.4 0 2 -6.5 0 3.7
  [4,16,-6.5,0,4.1,-8.4,0,4.4,-8.4,0,2,-6.5,0,3.7],
// 4 16 -6.5 0 3.7 -8.4 0 2 -8.4 0 .6 -6.5 0 .7
  [4,16,-6.5,0,3.7,-8.4,0,2,-8.4,0,.6,-6.5,0,.7],
// 4 16 -8.4 0 -1.2 -6.5 0 .3 -6.5 0 .7 -8.4 0 .6
  [4,16,-8.4,0,-1.2,-6.5,0,.3,-6.5,0,.7,-8.4,0,.6],
// 4 16 -6.5 0 .3 -8.4 0 -1.2 -8.4 0 -2.9 -6.5 0 -2.7
  [4,16,-6.5,0,.3,-8.4,0,-1.2,-8.4,0,-2.9,-6.5,0,-2.7],
// 4 16 -8.4 0 -2.9 -8.4 0 -4.9 -6.8 0 -7 -6.8 0 -3.4
  [4,16,-8.4,0,-2.9,-8.4,0,-4.9,-6.8,0,-7,-6.8,0,-3.4],
// 3 16 -8.4 0.0 -4.9 -8.4 0.0 -6.2 -6.8 0.0 -7.0
  [3,16,-8.4,0.0,-4.9,-8.4,0.0,-6.2,-6.8,0.0,-7.0],
// 4 16 11.9 0 -7.7 11 0 -6.2 8.8 0 -6.2 7 0 -7
  [4,16,11.9,0,-7.7,11,0,-6.2,8.8,0,-6.2,7,0,-7],
// 4 72 -11.9 0 7.7 -13.5 0 9.2 -13.5 0 -9.2 -11.9 0 0
  [4,72,-11.9,0,7.7,-13.5,0,9.2,-13.5,0,-9.2,-11.9,0,0],
// 3 72 -11.9 0.0 0.0 -13.5 0.0 -9.2 -11.9 0.0 -7.7
  [3,72,-11.9,0.0,0.0,-13.5,0.0,-9.2,-11.9,0.0,-7.7],
// 4 72 13.5 0 -9.2 0 0 -7.7 -11.9 0 -7.7 -13.5 0 -9.2
  [4,72,13.5,0,-9.2,0,0,-7.7,-11.9,0,-7.7,-13.5,0,-9.2],
// 3 72 11.9 0.0 -7.7 0.0 0.0 -7.7 13.5 0.0 -9.2
  [3,72,11.9,0.0,-7.7,0.0,0.0,-7.7,13.5,0.0,-9.2],
// 4 72 11.9 0 -7.7 13.5 0 -9.2 13.5 0 9.2 11.9 0 0
  [4,72,11.9,0,-7.7,13.5,0,-9.2,13.5,0,9.2,11.9,0,0],
// 3 72 13.5 0.0 9.2 11.9 0.0 7.7 11.9 0.0 0.0
  [3,72,13.5,0.0,9.2,11.9,0.0,7.7,11.9,0.0,0.0],
// 4 72 -11.9 0 7.7 0 0 7.7 13.5 0 9.2 -13.5 0 9.2
  [4,72,-11.9,0,7.7,0,0,7.7,13.5,0,9.2,-13.5,0,9.2],
// 3 72 13.5 0.0 9.2 0.0 0.0 7.7 11.9 0.0 7.7
  [3,72,13.5,0.0,9.2,0.0,0.0,7.7,11.9,0.0,7.7],
// 4 16 -11.9 0 0 -10.6 0 4.4 -10.6 0 5.7 -11.9 0 7.7
  [4,16,-11.9,0,0,-10.6,0,4.4,-10.6,0,5.7,-11.9,0,7.7],
// 3 16 -10.6 0.0 4.4 -11.9 0.0 0.0 -10.6 0.0 2.0
  [3,16,-10.6,0.0,4.4,-11.9,0.0,0.0,-10.6,0.0,2.0],
// 3 16 -10.6 0.0 2.0 -11.9 0.0 0.0 -10.6 0.0 0.6
  [3,16,-10.6,0.0,2.0,-11.9,0.0,0.0,-10.6,0.0,0.6],
// 3 16 -10.6 0.0 0.6 -11.9 0.0 0.0 -10.6 0.0 -1.2
  [3,16,-10.6,0.0,0.6,-11.9,0.0,0.0,-10.6,0.0,-1.2],
// 4 16 -10.6 0 -1.2 -11.9 0 0 -11.9 0 -7.7 -10.6 0 -2.9
  [4,16,-10.6,0,-1.2,-11.9,0,0,-11.9,0,-7.7,-10.6,0,-2.9],
// 3 16 -10.6 0.0 -2.9 -11.9 0.0 -7.7 -10.6 0.0 -4.9
  [3,16,-10.6,0.0,-2.9,-11.9,0.0,-7.7,-10.6,0.0,-4.9],
// 3 16 -10.6 0.0 -4.9 -11.9 0.0 -7.7 -10.6 0.0 -6.2
  [3,16,-10.6,0.0,-4.9,-11.9,0.0,-7.7,-10.6,0.0,-6.2],
// 4 16 -8.4 0 -6.2 -10.6 0 -6.2 -11.9 0 -7.7 -6.8 0 -7
  [4,16,-8.4,0,-6.2,-10.6,0,-6.2,-11.9,0,-7.7,-6.8,0,-7],
// 3 16 0.7 0.0 -7.0 -0.8 0.0 -7.0 0.0 0.0 -7.7
  [3,16,0.7,0.0,-7.0,-0.8,0.0,-7.0,0.0,0.0,-7.7],
// 3 16 3.1 0.0 -7.0 0.7 0.0 -7.0 0.0 0.0 -7.7
  [3,16,3.1,0.0,-7.0,0.7,0.0,-7.0,0.0,0.0,-7.7],
// 3 16 4.6 0.0 -7.0 3.1 0.0 -7.0 0.0 0.0 -7.7
  [3,16,4.6,0.0,-7.0,3.1,0.0,-7.0,0.0,0.0,-7.7],
// 4 16 4.6 0 -7 0 0 -7.7 11.9 0 -7.7 7 0 -7
  [4,16,4.6,0,-7,0,0,-7.7,11.9,0,-7.7,7,0,-7],
// 3 16 11.0 0.0 -4.9 11.0 0.0 -6.2 11.9 0.0 -7.7
  [3,16,11.0,0.0,-4.9,11.0,0.0,-6.2,11.9,0.0,-7.7],
// 4 16 11 0 -4.9 11.9 0 -7.7 11.9 0 0 11 0 -2.9
  [4,16,11,0,-4.9,11.9,0,-7.7,11.9,0,0,11,0,-2.9],
// 3 16 11.9 0.0 0.0 11.0 0.0 -1.2 11.0 0.0 -2.9
  [3,16,11.9,0.0,0.0,11.0,0.0,-1.2,11.0,0.0,-2.9],
// 3 16 11.0 0.0 0.6 11.0 0.0 -1.2 11.9 0.0 0.0
  [3,16,11.0,0.0,0.6,11.0,0.0,-1.2,11.9,0.0,0.0],
// 3 16 11 0 2 11.0 0.0 0.6 11.9 0.0 0.0
  [3,16,11,0,2,11.0,0.0,0.6,11.9,0.0,0.0],
// 3 16 11.0 0.0 4.4 11 0 2 11.9 0.0 0.0
  [3,16,11.0,0.0,4.4,11,0,2,11.9,0.0,0.0],
// 4 16 11 0 4.4 11.9 0 0 11.9 0 7.7 11 0 5.7
  [4,16,11,0,4.4,11.9,0,0,11.9,0,7.7,11,0,5.7],
// 4 16 10.3 0 5.7 11 0 5.7 11.9 0 7.7 10.3 0 6.8
  [4,16,10.3,0,5.7,11,0,5.7,11.9,0,7.7,10.3,0,6.8],
// 4 16 -6.5 0 7.1 -11.9 0 7.7 -9.9 0 6.8 -9.1 0 6.8
  [4,16,-6.5,0,7.1,-11.9,0,7.7,-9.9,0,6.8,-9.1,0,6.8],
// 4 16 -6.5 0 7.1 0 0 7.1 0 0 7.7 -11.9 0 7.7
  [4,16,-6.5,0,7.1,0,0,7.1,0,0,7.7,-11.9,0,7.7],
// 4 16 0 0 7.1 9.5 0 6.8 11.9 0 7.7 0 0 7.7
  [4,16,0,0,7.1,9.5,0,6.8,11.9,0,7.7,0,0,7.7],
// 3 16 11.9 0.0 7.7 9.5 0.0 6.8 10.3 0.0 6.8
  [3,16,11.9,0.0,7.7,9.5,0.0,6.8,10.3,0.0,6.8],
// 4 16 -6.8 0 -7 -11.9 0 -7.7 0 0 -7.7 -4.4 0 -7
  [4,16,-6.8,0,-7,-11.9,0,-7.7,0,0,-7.7,-4.4,0,-7],
// 3 16 -3.2 0.0 -7.0 -4.4 0.0 -7.0 0.0 0.0 -7.7
  [3,16,-3.2,0.0,-7.0,-4.4,0.0,-7.0,0.0,0.0,-7.7],
// 3 16 -0.8 0.0 -7.0 -3.2 0.0 -7.0 0.0 0.0 -7.7
  [3,16,-0.8,0.0,-7.0,-3.2,0.0,-7.0,0.0,0.0,-7.7],
// 4 16 -20 0 -10 -13.5 0 -9.2 -13.5 0 9.2 -20 0 10
  [4,16,-20,0,-10,-13.5,0,-9.2,-13.5,0,9.2,-20,0,10],
// 4 16 -20 0 -10 20 0 -10 13.5 0 -9.2 -13.5 0 -9.2
  [4,16,-20,0,-10,20,0,-10,13.5,0,-9.2,-13.5,0,-9.2],
// 4 16 13.5 0 -9.2 20 0 -10 20 0 10 13.5 0 9.2
  [4,16,13.5,0,-9.2,20,0,-10,20,0,10,13.5,0,9.2],
// 4 16 -13.5 0 9.2 13.5 0 9.2 20 0 10 -20 0 10
  [4,16,-13.5,0,9.2,13.5,0,9.2,20,0,10,-20,0,10],
];
module ldraw_lib__3069bpzk(step=0, col=false, unit=2/5, alt=false, line=0.2, solid=!$preview)
    makepoly(ldraw_lib__3069bpzk(), step=step, col=col, unit=unit, alt=alt, line=line, solid=solid);
ldraw_lib__3069bpzk(line=0.2);
